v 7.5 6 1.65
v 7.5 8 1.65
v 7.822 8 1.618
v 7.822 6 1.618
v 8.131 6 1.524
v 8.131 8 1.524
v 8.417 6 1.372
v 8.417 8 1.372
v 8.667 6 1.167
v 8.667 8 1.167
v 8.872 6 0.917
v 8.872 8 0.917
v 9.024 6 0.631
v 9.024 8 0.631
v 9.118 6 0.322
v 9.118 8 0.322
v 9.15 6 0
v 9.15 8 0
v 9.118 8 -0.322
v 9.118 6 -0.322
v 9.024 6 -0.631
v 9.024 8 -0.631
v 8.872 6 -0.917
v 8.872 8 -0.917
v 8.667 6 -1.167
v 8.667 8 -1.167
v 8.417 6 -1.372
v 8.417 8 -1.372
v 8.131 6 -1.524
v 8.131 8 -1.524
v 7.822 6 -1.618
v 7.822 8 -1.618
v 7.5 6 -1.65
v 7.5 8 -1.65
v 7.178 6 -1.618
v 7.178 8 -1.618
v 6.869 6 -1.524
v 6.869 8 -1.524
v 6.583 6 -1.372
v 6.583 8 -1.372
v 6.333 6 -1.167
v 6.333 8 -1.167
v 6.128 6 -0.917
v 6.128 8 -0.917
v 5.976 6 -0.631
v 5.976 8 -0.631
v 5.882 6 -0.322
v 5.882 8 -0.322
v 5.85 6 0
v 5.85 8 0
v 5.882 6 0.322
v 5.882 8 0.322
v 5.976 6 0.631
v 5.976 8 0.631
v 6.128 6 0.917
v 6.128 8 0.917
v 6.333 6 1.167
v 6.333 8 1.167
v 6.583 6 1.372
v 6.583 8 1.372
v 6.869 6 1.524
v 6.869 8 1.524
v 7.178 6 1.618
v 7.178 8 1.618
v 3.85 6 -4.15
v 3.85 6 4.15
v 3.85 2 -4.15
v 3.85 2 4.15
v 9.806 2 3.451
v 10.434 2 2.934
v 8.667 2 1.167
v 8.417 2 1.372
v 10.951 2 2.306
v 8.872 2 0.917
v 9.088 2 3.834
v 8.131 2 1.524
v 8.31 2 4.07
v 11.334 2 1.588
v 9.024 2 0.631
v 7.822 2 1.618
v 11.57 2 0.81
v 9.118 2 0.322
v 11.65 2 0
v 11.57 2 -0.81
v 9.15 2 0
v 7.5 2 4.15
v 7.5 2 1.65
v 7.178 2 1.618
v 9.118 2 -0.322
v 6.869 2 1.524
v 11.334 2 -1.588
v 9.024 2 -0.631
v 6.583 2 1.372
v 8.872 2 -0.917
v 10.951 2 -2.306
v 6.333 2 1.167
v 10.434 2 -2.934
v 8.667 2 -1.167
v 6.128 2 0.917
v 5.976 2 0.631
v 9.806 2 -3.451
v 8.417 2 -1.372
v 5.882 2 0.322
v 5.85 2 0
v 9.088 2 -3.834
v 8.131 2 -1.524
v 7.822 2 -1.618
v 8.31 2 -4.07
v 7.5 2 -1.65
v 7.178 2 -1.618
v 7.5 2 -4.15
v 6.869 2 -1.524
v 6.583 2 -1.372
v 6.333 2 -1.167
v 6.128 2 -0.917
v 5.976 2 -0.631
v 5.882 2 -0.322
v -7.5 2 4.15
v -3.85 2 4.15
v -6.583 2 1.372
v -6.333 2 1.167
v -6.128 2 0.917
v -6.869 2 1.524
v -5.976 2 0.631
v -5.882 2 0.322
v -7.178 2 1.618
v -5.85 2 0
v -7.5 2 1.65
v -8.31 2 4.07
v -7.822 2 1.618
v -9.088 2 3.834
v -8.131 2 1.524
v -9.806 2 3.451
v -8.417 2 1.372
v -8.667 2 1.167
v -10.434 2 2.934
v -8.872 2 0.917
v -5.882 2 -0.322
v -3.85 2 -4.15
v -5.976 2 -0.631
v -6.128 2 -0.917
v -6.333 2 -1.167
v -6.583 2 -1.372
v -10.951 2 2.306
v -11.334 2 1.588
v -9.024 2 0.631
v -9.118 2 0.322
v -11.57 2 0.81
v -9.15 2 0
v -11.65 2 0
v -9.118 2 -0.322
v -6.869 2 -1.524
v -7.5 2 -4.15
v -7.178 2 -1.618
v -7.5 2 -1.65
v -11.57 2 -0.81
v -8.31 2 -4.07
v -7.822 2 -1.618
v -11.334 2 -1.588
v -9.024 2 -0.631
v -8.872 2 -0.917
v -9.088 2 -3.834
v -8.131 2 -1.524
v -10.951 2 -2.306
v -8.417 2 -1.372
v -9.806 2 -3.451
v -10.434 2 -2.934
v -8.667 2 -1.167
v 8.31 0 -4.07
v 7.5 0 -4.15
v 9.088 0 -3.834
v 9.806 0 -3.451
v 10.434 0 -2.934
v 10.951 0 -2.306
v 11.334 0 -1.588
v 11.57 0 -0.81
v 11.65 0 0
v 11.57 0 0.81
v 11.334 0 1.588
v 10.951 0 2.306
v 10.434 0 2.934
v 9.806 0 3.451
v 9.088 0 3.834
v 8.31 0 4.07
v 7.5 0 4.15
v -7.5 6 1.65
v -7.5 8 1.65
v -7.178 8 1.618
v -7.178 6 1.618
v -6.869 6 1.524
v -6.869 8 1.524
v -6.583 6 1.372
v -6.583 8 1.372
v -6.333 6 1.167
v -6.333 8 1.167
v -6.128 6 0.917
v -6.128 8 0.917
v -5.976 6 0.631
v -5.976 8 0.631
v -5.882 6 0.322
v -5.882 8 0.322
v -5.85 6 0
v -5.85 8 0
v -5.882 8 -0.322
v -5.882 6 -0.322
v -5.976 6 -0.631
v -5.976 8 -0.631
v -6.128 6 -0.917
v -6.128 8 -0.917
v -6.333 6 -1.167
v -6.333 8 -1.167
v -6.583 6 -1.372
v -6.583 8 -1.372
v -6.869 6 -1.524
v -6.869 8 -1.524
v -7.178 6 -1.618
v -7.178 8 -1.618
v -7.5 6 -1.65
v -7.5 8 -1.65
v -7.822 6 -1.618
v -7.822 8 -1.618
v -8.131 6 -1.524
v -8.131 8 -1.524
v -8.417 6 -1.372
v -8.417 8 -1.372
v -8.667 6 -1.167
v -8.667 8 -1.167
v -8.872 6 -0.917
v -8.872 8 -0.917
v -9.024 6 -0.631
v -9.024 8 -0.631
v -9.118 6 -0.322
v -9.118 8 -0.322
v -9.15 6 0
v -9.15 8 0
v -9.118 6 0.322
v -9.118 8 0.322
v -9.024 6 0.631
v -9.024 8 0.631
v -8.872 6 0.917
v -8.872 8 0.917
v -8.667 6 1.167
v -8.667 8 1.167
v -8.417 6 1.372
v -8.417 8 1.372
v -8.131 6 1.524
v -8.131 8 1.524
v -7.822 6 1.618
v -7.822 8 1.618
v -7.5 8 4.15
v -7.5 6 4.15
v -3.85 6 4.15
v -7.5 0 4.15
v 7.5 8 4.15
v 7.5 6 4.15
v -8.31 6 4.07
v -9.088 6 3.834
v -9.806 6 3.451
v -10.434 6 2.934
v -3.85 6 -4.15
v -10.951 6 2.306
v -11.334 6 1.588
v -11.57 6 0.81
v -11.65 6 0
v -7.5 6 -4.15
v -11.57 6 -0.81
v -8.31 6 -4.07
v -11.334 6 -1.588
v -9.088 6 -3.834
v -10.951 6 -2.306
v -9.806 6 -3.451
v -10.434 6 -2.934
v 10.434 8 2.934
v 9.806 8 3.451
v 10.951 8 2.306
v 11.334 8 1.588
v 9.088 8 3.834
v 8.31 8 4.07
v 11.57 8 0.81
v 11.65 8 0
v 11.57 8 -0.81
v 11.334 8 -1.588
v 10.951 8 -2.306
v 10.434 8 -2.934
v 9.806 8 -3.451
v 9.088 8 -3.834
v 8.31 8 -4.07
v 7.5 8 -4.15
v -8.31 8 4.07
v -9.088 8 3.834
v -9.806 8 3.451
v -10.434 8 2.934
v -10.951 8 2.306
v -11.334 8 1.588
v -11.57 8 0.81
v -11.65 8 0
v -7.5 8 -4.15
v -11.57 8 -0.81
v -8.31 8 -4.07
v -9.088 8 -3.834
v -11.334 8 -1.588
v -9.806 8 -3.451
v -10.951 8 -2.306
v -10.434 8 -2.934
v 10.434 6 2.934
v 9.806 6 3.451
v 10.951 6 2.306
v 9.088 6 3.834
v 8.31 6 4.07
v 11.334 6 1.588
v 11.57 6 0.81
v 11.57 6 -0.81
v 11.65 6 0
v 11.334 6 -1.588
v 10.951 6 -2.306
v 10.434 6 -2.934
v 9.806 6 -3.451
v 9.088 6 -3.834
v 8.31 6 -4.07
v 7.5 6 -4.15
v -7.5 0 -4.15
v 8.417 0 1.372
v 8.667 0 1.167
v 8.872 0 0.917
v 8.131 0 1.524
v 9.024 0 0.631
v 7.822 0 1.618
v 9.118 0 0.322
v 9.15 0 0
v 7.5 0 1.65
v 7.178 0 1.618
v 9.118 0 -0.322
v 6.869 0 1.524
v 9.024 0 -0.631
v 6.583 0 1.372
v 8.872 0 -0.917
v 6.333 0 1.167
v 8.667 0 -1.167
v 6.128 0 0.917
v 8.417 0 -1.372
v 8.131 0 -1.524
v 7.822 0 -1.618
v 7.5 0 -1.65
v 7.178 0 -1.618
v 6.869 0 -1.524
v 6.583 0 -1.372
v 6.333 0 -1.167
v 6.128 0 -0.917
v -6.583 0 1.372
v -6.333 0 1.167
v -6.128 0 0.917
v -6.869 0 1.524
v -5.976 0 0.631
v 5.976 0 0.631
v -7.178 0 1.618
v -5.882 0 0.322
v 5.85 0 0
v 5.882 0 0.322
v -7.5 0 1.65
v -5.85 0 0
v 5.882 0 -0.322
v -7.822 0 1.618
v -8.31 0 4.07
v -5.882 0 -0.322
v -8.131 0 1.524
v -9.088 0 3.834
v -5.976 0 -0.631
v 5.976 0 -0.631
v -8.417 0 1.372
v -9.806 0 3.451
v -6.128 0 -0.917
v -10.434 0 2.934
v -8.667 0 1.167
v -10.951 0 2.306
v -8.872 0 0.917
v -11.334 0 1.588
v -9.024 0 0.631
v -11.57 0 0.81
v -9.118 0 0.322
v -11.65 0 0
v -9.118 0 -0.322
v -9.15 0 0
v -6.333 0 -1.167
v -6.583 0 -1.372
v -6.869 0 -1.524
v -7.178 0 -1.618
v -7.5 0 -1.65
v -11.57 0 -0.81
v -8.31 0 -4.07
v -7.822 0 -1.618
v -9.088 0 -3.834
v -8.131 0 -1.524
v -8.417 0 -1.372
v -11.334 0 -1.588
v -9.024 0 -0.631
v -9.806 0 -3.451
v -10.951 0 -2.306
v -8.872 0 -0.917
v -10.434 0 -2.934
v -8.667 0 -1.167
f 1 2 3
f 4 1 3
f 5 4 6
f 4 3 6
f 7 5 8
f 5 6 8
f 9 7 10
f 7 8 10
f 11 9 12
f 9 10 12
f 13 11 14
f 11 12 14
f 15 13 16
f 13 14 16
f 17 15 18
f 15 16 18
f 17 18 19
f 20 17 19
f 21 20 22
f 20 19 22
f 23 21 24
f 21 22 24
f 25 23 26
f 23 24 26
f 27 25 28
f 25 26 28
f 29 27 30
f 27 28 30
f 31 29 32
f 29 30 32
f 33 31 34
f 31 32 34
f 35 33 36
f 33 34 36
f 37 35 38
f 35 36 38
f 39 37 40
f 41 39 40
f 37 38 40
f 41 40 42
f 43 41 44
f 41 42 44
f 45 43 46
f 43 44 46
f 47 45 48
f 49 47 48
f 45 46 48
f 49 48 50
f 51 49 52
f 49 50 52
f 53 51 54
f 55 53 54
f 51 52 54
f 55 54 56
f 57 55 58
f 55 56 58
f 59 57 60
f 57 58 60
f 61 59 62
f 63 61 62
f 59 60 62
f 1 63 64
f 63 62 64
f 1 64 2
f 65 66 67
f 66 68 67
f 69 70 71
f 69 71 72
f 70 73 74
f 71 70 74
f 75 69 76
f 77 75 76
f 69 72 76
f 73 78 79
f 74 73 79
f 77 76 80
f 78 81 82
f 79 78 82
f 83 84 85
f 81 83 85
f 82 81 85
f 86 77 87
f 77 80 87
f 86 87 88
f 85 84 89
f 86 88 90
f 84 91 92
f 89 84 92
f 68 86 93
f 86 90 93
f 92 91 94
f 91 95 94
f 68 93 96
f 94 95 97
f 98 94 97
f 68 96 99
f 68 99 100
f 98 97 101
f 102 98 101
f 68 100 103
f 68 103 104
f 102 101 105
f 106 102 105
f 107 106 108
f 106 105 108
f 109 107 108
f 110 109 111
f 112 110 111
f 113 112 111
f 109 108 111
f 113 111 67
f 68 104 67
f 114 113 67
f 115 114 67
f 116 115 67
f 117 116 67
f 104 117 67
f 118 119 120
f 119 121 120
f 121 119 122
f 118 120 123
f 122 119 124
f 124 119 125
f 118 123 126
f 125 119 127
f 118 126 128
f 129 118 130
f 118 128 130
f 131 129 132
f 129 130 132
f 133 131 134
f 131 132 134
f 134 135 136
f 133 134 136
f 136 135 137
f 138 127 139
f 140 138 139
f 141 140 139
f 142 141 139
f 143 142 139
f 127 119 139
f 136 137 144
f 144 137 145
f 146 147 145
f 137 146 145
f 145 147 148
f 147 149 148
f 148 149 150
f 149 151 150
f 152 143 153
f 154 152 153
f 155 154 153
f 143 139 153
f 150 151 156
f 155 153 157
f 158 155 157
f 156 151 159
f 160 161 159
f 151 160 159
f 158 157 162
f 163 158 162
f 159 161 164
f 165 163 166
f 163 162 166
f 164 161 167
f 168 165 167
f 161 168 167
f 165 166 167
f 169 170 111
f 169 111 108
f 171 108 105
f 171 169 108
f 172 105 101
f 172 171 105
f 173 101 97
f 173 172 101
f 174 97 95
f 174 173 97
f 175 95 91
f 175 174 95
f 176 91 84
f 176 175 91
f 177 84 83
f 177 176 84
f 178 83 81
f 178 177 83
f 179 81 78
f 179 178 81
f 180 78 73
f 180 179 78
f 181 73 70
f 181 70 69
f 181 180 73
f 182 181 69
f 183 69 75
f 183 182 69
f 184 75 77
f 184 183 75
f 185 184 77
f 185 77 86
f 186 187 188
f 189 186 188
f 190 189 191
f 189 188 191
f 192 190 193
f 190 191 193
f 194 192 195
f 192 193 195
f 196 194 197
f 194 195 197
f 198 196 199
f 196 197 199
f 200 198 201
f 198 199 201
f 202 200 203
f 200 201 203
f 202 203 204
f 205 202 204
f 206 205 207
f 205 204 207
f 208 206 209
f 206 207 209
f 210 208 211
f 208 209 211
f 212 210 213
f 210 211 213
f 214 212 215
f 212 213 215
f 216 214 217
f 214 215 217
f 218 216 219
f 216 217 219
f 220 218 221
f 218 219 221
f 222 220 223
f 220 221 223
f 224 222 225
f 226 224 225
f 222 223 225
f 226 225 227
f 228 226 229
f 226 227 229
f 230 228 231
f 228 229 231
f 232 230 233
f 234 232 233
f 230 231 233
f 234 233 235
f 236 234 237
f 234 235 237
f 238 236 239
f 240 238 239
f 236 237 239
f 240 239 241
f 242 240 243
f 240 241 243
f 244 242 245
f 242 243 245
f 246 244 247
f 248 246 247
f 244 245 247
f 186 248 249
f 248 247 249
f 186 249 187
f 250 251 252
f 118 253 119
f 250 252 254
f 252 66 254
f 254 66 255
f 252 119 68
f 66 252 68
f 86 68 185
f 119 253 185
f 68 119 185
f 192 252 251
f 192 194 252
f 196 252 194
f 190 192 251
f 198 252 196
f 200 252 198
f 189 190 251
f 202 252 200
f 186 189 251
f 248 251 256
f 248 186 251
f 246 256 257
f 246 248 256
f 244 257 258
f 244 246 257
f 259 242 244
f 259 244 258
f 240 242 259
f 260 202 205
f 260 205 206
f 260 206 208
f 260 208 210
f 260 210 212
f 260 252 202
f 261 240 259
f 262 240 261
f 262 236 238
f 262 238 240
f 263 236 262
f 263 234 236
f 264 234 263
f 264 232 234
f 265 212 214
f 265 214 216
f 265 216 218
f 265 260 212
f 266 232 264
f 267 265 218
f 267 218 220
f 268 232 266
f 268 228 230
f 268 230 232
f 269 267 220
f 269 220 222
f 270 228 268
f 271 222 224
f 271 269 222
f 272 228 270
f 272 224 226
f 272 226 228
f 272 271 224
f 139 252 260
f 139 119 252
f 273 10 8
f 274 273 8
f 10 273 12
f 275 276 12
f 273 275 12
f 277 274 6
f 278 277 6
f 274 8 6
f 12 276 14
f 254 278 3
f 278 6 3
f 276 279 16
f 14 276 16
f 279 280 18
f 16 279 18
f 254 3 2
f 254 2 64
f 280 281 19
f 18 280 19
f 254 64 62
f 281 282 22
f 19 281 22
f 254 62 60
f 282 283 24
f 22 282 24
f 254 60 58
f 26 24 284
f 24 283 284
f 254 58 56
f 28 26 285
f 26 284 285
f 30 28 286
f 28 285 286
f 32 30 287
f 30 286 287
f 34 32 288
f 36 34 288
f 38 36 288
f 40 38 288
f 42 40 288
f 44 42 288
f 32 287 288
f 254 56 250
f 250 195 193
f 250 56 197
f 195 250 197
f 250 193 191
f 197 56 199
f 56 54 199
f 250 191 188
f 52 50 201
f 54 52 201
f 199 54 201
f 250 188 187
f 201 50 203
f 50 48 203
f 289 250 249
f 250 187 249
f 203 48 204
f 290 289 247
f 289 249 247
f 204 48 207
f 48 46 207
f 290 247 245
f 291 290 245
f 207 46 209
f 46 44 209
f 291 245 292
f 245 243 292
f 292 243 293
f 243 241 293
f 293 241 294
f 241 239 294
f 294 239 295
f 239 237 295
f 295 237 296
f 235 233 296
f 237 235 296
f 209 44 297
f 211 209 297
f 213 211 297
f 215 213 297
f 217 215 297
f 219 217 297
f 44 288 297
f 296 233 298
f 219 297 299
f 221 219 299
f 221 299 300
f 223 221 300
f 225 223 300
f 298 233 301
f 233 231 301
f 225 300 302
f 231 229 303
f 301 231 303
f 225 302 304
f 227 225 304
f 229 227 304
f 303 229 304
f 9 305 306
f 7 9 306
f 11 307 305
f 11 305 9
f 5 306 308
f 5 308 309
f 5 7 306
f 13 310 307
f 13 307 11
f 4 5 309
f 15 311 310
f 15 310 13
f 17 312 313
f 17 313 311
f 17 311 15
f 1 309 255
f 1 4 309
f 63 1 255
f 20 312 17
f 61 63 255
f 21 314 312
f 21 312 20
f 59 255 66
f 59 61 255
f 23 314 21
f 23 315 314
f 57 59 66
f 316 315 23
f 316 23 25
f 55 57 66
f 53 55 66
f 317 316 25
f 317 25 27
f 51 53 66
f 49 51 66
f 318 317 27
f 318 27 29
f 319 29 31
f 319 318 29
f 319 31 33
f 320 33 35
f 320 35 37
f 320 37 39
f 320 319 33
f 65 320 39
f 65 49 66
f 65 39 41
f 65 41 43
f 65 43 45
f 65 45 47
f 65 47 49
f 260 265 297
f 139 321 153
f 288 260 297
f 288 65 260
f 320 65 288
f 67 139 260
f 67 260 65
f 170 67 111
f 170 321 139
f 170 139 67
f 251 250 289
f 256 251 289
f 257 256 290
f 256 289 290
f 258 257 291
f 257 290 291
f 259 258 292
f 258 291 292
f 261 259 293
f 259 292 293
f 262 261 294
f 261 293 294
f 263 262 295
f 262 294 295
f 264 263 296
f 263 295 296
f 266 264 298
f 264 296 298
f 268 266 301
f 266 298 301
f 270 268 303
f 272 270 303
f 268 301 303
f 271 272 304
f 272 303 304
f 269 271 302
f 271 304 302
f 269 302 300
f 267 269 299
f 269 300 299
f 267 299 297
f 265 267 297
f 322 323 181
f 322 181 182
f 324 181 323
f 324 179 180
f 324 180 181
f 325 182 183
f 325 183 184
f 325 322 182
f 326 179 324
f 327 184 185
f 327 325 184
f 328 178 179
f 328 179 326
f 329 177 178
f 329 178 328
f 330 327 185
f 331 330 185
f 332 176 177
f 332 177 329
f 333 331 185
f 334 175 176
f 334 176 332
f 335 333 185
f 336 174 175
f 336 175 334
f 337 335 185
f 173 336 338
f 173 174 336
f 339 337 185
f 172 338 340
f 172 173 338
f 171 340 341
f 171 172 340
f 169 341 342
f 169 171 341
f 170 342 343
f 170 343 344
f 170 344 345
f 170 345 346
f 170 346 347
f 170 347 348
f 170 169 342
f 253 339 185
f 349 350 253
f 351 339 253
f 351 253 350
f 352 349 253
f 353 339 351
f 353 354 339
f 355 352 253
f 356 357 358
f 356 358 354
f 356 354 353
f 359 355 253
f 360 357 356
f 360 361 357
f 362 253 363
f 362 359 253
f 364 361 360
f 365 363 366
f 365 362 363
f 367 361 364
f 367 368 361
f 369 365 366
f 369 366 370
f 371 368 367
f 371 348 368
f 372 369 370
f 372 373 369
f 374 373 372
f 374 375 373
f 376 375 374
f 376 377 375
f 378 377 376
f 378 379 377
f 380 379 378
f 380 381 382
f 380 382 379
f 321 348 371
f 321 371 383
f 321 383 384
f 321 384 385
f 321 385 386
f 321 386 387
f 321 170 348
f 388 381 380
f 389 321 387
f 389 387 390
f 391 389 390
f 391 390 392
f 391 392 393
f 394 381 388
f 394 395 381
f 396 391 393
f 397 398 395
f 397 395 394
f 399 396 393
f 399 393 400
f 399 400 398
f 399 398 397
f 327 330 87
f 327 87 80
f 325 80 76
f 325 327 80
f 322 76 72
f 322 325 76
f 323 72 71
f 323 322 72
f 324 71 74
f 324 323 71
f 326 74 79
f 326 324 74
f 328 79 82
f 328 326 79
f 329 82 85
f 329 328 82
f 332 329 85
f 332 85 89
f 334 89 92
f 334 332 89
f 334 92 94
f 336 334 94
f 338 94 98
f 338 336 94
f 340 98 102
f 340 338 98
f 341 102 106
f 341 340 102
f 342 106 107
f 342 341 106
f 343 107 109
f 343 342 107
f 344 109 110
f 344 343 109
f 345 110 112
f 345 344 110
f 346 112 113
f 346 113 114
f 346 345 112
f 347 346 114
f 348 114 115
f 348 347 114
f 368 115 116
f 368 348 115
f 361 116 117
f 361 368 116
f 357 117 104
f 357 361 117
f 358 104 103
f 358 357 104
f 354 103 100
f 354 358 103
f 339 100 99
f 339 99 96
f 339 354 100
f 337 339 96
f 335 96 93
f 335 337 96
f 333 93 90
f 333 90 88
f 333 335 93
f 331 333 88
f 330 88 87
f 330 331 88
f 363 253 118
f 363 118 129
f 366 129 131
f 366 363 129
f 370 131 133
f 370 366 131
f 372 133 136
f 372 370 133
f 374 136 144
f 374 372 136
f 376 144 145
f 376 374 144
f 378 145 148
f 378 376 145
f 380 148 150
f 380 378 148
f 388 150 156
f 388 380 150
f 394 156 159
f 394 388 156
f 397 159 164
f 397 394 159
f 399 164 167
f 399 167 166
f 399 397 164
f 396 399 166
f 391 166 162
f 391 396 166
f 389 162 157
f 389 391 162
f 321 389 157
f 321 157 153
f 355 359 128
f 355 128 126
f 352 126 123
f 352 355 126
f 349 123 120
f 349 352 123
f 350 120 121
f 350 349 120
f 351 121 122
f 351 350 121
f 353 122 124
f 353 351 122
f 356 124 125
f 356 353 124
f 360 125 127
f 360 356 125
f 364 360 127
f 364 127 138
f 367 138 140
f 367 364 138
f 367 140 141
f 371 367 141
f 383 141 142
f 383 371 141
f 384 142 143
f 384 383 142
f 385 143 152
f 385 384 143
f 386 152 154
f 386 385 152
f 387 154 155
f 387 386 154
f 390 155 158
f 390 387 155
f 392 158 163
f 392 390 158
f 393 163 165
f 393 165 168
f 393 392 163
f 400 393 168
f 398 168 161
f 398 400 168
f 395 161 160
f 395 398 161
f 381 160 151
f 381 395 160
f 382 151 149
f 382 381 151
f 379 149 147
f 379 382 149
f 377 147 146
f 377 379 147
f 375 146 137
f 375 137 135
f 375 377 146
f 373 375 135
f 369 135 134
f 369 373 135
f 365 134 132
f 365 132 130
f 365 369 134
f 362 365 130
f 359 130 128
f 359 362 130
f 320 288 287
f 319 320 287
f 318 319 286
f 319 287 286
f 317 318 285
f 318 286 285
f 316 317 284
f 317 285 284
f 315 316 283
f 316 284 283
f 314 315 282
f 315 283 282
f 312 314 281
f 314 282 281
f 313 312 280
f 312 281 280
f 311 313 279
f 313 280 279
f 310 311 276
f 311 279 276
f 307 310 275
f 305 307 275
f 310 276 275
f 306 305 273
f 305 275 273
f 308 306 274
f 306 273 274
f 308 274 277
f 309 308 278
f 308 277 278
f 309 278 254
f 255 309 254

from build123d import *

# Parameters (mm, degrees)
SKETCH1_R           = 1.65
BOSS_EXTRUDE1_DEPTH = 2
SKETCH2_W           = 7.7
SKETCH2_H           = 8.3
BOSS_EXTRUDE2_DEPTH = 1


with BuildPart() as part:
    # Sketch1 → Boss-Extrude1 (new body)
    with BuildSketch(Plane(origin=(0, 0, 0), x_dir=(1, 0, 0), z_dir=(0, 1, 0))):
        with BuildLine():
            Line((-7.5, 4.15), (7.5, 4.15))
            ThreePointArc((7.5, 4.15), (11.65, 0), (7.5, -4.15))
            Line((7.5, -4.15), (-7.5, -4.15))
            ThreePointArc((-7.5, -4.15), (-11.65, 0), (-7.5, 4.15))
        make_face()
        with Locations(Location((-7.5, 0, 0), (0, 0, 270))):
            Circle(SKETCH1_R, mode=Mode.SUBTRACT)
        with Locations(Location((7.5, 0, 0), (0, 0, 270))):
            Circle(SKETCH1_R, mode=Mode.SUBTRACT)
    extrude(amount=BOSS_EXTRUDE1_DEPTH)

    # Sketch2 → Boss-Extrude2 (add)
    with BuildSketch(Plane(origin=(0, 2, 0), x_dir=(1, 0, 0), z_dir=(0, 1, 0))):
        Rectangle(SKETCH2_W, SKETCH2_H)
    boss_extrude2 = extrude(amount=BOSS_EXTRUDE2_DEPTH)

    # Mirror1: Boss-Extrude2 across plane
    add(boss_extrude2.mirror(Plane.ZX.offset(3)))

    # Mirror4: part across plane


with BuildPart() as part_1:
    add(part.part)
    add(part.part.mirror(Plane(origin=(0, 4, 0), x_dir=(0, 0, 1), z_dir=(0, -1, 0))))


solid = part_1.part
